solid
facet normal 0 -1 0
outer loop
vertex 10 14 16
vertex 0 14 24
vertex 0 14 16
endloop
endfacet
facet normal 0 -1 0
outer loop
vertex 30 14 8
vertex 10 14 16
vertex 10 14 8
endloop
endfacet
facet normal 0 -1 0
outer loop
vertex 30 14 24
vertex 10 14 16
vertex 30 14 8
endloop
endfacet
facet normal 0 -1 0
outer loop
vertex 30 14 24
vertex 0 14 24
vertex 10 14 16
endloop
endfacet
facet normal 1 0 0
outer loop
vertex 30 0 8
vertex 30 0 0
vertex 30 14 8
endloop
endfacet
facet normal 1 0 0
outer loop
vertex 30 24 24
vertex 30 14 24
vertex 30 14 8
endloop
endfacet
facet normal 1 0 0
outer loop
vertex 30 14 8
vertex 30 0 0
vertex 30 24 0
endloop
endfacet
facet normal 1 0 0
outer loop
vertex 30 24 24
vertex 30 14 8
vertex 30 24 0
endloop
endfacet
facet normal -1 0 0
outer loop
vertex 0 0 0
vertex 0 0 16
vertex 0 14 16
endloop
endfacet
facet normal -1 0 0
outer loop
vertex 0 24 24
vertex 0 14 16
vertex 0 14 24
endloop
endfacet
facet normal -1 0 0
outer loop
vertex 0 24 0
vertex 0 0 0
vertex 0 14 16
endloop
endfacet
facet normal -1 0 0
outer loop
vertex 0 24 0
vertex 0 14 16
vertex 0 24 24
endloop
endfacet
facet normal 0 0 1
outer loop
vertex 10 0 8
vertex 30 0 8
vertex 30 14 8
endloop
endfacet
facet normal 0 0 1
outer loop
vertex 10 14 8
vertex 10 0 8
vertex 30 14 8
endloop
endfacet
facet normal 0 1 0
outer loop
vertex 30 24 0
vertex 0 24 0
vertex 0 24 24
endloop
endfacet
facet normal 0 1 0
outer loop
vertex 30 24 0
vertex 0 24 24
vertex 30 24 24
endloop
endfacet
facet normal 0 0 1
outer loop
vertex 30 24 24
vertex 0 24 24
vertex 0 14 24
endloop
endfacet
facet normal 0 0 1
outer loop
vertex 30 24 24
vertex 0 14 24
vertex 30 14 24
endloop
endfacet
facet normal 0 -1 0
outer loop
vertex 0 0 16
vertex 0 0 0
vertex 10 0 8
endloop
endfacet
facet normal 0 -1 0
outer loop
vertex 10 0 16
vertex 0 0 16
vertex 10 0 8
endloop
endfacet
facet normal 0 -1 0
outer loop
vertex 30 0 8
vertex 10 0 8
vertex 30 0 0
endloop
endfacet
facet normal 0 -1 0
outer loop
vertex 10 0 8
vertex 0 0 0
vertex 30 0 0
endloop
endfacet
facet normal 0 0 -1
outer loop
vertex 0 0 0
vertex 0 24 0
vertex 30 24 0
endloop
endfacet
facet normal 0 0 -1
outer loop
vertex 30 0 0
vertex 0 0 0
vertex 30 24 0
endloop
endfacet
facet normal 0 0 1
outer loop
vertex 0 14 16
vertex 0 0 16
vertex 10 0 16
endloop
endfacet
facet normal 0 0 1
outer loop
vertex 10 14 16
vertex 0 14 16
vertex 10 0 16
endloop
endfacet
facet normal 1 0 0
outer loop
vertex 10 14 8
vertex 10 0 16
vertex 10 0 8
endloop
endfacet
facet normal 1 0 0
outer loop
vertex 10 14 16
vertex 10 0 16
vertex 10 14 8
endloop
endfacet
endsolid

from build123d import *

# Parameters (mm, degrees)
F0_W     = 30
F0_H     = 24
F1_DEPTH = 24
F2_W     = 14
F2_H     = 16
F3_DEPTH = 20
F4_W     = 10
F4_H     = 8
F5_DEPTH = 14


with BuildPart() as f1:
    # F0 (on Top) → F1 (new body)
    with BuildSketch(Plane.XY):
        with Locations((15, 12)):
            Rectangle(F0_W, F0_H)
    extrude(amount=F1_DEPTH)

    # F2 (on face) → F3 (cut)
    with BuildSketch(Plane.YZ.offset(30)):
        with Locations((7, 16)):
            Rectangle(F2_W, F2_H)
    extrude(amount=-F3_DEPTH, mode=Mode.SUBTRACT)

    # F4 (on face) → F5 (cut)
    with BuildSketch(Plane.XZ):
        with Locations((5, 20)):
            Rectangle(F4_W, F4_H)
    extrude(amount=-F5_DEPTH, mode=Mode.SUBTRACT)


solid = f1.part
